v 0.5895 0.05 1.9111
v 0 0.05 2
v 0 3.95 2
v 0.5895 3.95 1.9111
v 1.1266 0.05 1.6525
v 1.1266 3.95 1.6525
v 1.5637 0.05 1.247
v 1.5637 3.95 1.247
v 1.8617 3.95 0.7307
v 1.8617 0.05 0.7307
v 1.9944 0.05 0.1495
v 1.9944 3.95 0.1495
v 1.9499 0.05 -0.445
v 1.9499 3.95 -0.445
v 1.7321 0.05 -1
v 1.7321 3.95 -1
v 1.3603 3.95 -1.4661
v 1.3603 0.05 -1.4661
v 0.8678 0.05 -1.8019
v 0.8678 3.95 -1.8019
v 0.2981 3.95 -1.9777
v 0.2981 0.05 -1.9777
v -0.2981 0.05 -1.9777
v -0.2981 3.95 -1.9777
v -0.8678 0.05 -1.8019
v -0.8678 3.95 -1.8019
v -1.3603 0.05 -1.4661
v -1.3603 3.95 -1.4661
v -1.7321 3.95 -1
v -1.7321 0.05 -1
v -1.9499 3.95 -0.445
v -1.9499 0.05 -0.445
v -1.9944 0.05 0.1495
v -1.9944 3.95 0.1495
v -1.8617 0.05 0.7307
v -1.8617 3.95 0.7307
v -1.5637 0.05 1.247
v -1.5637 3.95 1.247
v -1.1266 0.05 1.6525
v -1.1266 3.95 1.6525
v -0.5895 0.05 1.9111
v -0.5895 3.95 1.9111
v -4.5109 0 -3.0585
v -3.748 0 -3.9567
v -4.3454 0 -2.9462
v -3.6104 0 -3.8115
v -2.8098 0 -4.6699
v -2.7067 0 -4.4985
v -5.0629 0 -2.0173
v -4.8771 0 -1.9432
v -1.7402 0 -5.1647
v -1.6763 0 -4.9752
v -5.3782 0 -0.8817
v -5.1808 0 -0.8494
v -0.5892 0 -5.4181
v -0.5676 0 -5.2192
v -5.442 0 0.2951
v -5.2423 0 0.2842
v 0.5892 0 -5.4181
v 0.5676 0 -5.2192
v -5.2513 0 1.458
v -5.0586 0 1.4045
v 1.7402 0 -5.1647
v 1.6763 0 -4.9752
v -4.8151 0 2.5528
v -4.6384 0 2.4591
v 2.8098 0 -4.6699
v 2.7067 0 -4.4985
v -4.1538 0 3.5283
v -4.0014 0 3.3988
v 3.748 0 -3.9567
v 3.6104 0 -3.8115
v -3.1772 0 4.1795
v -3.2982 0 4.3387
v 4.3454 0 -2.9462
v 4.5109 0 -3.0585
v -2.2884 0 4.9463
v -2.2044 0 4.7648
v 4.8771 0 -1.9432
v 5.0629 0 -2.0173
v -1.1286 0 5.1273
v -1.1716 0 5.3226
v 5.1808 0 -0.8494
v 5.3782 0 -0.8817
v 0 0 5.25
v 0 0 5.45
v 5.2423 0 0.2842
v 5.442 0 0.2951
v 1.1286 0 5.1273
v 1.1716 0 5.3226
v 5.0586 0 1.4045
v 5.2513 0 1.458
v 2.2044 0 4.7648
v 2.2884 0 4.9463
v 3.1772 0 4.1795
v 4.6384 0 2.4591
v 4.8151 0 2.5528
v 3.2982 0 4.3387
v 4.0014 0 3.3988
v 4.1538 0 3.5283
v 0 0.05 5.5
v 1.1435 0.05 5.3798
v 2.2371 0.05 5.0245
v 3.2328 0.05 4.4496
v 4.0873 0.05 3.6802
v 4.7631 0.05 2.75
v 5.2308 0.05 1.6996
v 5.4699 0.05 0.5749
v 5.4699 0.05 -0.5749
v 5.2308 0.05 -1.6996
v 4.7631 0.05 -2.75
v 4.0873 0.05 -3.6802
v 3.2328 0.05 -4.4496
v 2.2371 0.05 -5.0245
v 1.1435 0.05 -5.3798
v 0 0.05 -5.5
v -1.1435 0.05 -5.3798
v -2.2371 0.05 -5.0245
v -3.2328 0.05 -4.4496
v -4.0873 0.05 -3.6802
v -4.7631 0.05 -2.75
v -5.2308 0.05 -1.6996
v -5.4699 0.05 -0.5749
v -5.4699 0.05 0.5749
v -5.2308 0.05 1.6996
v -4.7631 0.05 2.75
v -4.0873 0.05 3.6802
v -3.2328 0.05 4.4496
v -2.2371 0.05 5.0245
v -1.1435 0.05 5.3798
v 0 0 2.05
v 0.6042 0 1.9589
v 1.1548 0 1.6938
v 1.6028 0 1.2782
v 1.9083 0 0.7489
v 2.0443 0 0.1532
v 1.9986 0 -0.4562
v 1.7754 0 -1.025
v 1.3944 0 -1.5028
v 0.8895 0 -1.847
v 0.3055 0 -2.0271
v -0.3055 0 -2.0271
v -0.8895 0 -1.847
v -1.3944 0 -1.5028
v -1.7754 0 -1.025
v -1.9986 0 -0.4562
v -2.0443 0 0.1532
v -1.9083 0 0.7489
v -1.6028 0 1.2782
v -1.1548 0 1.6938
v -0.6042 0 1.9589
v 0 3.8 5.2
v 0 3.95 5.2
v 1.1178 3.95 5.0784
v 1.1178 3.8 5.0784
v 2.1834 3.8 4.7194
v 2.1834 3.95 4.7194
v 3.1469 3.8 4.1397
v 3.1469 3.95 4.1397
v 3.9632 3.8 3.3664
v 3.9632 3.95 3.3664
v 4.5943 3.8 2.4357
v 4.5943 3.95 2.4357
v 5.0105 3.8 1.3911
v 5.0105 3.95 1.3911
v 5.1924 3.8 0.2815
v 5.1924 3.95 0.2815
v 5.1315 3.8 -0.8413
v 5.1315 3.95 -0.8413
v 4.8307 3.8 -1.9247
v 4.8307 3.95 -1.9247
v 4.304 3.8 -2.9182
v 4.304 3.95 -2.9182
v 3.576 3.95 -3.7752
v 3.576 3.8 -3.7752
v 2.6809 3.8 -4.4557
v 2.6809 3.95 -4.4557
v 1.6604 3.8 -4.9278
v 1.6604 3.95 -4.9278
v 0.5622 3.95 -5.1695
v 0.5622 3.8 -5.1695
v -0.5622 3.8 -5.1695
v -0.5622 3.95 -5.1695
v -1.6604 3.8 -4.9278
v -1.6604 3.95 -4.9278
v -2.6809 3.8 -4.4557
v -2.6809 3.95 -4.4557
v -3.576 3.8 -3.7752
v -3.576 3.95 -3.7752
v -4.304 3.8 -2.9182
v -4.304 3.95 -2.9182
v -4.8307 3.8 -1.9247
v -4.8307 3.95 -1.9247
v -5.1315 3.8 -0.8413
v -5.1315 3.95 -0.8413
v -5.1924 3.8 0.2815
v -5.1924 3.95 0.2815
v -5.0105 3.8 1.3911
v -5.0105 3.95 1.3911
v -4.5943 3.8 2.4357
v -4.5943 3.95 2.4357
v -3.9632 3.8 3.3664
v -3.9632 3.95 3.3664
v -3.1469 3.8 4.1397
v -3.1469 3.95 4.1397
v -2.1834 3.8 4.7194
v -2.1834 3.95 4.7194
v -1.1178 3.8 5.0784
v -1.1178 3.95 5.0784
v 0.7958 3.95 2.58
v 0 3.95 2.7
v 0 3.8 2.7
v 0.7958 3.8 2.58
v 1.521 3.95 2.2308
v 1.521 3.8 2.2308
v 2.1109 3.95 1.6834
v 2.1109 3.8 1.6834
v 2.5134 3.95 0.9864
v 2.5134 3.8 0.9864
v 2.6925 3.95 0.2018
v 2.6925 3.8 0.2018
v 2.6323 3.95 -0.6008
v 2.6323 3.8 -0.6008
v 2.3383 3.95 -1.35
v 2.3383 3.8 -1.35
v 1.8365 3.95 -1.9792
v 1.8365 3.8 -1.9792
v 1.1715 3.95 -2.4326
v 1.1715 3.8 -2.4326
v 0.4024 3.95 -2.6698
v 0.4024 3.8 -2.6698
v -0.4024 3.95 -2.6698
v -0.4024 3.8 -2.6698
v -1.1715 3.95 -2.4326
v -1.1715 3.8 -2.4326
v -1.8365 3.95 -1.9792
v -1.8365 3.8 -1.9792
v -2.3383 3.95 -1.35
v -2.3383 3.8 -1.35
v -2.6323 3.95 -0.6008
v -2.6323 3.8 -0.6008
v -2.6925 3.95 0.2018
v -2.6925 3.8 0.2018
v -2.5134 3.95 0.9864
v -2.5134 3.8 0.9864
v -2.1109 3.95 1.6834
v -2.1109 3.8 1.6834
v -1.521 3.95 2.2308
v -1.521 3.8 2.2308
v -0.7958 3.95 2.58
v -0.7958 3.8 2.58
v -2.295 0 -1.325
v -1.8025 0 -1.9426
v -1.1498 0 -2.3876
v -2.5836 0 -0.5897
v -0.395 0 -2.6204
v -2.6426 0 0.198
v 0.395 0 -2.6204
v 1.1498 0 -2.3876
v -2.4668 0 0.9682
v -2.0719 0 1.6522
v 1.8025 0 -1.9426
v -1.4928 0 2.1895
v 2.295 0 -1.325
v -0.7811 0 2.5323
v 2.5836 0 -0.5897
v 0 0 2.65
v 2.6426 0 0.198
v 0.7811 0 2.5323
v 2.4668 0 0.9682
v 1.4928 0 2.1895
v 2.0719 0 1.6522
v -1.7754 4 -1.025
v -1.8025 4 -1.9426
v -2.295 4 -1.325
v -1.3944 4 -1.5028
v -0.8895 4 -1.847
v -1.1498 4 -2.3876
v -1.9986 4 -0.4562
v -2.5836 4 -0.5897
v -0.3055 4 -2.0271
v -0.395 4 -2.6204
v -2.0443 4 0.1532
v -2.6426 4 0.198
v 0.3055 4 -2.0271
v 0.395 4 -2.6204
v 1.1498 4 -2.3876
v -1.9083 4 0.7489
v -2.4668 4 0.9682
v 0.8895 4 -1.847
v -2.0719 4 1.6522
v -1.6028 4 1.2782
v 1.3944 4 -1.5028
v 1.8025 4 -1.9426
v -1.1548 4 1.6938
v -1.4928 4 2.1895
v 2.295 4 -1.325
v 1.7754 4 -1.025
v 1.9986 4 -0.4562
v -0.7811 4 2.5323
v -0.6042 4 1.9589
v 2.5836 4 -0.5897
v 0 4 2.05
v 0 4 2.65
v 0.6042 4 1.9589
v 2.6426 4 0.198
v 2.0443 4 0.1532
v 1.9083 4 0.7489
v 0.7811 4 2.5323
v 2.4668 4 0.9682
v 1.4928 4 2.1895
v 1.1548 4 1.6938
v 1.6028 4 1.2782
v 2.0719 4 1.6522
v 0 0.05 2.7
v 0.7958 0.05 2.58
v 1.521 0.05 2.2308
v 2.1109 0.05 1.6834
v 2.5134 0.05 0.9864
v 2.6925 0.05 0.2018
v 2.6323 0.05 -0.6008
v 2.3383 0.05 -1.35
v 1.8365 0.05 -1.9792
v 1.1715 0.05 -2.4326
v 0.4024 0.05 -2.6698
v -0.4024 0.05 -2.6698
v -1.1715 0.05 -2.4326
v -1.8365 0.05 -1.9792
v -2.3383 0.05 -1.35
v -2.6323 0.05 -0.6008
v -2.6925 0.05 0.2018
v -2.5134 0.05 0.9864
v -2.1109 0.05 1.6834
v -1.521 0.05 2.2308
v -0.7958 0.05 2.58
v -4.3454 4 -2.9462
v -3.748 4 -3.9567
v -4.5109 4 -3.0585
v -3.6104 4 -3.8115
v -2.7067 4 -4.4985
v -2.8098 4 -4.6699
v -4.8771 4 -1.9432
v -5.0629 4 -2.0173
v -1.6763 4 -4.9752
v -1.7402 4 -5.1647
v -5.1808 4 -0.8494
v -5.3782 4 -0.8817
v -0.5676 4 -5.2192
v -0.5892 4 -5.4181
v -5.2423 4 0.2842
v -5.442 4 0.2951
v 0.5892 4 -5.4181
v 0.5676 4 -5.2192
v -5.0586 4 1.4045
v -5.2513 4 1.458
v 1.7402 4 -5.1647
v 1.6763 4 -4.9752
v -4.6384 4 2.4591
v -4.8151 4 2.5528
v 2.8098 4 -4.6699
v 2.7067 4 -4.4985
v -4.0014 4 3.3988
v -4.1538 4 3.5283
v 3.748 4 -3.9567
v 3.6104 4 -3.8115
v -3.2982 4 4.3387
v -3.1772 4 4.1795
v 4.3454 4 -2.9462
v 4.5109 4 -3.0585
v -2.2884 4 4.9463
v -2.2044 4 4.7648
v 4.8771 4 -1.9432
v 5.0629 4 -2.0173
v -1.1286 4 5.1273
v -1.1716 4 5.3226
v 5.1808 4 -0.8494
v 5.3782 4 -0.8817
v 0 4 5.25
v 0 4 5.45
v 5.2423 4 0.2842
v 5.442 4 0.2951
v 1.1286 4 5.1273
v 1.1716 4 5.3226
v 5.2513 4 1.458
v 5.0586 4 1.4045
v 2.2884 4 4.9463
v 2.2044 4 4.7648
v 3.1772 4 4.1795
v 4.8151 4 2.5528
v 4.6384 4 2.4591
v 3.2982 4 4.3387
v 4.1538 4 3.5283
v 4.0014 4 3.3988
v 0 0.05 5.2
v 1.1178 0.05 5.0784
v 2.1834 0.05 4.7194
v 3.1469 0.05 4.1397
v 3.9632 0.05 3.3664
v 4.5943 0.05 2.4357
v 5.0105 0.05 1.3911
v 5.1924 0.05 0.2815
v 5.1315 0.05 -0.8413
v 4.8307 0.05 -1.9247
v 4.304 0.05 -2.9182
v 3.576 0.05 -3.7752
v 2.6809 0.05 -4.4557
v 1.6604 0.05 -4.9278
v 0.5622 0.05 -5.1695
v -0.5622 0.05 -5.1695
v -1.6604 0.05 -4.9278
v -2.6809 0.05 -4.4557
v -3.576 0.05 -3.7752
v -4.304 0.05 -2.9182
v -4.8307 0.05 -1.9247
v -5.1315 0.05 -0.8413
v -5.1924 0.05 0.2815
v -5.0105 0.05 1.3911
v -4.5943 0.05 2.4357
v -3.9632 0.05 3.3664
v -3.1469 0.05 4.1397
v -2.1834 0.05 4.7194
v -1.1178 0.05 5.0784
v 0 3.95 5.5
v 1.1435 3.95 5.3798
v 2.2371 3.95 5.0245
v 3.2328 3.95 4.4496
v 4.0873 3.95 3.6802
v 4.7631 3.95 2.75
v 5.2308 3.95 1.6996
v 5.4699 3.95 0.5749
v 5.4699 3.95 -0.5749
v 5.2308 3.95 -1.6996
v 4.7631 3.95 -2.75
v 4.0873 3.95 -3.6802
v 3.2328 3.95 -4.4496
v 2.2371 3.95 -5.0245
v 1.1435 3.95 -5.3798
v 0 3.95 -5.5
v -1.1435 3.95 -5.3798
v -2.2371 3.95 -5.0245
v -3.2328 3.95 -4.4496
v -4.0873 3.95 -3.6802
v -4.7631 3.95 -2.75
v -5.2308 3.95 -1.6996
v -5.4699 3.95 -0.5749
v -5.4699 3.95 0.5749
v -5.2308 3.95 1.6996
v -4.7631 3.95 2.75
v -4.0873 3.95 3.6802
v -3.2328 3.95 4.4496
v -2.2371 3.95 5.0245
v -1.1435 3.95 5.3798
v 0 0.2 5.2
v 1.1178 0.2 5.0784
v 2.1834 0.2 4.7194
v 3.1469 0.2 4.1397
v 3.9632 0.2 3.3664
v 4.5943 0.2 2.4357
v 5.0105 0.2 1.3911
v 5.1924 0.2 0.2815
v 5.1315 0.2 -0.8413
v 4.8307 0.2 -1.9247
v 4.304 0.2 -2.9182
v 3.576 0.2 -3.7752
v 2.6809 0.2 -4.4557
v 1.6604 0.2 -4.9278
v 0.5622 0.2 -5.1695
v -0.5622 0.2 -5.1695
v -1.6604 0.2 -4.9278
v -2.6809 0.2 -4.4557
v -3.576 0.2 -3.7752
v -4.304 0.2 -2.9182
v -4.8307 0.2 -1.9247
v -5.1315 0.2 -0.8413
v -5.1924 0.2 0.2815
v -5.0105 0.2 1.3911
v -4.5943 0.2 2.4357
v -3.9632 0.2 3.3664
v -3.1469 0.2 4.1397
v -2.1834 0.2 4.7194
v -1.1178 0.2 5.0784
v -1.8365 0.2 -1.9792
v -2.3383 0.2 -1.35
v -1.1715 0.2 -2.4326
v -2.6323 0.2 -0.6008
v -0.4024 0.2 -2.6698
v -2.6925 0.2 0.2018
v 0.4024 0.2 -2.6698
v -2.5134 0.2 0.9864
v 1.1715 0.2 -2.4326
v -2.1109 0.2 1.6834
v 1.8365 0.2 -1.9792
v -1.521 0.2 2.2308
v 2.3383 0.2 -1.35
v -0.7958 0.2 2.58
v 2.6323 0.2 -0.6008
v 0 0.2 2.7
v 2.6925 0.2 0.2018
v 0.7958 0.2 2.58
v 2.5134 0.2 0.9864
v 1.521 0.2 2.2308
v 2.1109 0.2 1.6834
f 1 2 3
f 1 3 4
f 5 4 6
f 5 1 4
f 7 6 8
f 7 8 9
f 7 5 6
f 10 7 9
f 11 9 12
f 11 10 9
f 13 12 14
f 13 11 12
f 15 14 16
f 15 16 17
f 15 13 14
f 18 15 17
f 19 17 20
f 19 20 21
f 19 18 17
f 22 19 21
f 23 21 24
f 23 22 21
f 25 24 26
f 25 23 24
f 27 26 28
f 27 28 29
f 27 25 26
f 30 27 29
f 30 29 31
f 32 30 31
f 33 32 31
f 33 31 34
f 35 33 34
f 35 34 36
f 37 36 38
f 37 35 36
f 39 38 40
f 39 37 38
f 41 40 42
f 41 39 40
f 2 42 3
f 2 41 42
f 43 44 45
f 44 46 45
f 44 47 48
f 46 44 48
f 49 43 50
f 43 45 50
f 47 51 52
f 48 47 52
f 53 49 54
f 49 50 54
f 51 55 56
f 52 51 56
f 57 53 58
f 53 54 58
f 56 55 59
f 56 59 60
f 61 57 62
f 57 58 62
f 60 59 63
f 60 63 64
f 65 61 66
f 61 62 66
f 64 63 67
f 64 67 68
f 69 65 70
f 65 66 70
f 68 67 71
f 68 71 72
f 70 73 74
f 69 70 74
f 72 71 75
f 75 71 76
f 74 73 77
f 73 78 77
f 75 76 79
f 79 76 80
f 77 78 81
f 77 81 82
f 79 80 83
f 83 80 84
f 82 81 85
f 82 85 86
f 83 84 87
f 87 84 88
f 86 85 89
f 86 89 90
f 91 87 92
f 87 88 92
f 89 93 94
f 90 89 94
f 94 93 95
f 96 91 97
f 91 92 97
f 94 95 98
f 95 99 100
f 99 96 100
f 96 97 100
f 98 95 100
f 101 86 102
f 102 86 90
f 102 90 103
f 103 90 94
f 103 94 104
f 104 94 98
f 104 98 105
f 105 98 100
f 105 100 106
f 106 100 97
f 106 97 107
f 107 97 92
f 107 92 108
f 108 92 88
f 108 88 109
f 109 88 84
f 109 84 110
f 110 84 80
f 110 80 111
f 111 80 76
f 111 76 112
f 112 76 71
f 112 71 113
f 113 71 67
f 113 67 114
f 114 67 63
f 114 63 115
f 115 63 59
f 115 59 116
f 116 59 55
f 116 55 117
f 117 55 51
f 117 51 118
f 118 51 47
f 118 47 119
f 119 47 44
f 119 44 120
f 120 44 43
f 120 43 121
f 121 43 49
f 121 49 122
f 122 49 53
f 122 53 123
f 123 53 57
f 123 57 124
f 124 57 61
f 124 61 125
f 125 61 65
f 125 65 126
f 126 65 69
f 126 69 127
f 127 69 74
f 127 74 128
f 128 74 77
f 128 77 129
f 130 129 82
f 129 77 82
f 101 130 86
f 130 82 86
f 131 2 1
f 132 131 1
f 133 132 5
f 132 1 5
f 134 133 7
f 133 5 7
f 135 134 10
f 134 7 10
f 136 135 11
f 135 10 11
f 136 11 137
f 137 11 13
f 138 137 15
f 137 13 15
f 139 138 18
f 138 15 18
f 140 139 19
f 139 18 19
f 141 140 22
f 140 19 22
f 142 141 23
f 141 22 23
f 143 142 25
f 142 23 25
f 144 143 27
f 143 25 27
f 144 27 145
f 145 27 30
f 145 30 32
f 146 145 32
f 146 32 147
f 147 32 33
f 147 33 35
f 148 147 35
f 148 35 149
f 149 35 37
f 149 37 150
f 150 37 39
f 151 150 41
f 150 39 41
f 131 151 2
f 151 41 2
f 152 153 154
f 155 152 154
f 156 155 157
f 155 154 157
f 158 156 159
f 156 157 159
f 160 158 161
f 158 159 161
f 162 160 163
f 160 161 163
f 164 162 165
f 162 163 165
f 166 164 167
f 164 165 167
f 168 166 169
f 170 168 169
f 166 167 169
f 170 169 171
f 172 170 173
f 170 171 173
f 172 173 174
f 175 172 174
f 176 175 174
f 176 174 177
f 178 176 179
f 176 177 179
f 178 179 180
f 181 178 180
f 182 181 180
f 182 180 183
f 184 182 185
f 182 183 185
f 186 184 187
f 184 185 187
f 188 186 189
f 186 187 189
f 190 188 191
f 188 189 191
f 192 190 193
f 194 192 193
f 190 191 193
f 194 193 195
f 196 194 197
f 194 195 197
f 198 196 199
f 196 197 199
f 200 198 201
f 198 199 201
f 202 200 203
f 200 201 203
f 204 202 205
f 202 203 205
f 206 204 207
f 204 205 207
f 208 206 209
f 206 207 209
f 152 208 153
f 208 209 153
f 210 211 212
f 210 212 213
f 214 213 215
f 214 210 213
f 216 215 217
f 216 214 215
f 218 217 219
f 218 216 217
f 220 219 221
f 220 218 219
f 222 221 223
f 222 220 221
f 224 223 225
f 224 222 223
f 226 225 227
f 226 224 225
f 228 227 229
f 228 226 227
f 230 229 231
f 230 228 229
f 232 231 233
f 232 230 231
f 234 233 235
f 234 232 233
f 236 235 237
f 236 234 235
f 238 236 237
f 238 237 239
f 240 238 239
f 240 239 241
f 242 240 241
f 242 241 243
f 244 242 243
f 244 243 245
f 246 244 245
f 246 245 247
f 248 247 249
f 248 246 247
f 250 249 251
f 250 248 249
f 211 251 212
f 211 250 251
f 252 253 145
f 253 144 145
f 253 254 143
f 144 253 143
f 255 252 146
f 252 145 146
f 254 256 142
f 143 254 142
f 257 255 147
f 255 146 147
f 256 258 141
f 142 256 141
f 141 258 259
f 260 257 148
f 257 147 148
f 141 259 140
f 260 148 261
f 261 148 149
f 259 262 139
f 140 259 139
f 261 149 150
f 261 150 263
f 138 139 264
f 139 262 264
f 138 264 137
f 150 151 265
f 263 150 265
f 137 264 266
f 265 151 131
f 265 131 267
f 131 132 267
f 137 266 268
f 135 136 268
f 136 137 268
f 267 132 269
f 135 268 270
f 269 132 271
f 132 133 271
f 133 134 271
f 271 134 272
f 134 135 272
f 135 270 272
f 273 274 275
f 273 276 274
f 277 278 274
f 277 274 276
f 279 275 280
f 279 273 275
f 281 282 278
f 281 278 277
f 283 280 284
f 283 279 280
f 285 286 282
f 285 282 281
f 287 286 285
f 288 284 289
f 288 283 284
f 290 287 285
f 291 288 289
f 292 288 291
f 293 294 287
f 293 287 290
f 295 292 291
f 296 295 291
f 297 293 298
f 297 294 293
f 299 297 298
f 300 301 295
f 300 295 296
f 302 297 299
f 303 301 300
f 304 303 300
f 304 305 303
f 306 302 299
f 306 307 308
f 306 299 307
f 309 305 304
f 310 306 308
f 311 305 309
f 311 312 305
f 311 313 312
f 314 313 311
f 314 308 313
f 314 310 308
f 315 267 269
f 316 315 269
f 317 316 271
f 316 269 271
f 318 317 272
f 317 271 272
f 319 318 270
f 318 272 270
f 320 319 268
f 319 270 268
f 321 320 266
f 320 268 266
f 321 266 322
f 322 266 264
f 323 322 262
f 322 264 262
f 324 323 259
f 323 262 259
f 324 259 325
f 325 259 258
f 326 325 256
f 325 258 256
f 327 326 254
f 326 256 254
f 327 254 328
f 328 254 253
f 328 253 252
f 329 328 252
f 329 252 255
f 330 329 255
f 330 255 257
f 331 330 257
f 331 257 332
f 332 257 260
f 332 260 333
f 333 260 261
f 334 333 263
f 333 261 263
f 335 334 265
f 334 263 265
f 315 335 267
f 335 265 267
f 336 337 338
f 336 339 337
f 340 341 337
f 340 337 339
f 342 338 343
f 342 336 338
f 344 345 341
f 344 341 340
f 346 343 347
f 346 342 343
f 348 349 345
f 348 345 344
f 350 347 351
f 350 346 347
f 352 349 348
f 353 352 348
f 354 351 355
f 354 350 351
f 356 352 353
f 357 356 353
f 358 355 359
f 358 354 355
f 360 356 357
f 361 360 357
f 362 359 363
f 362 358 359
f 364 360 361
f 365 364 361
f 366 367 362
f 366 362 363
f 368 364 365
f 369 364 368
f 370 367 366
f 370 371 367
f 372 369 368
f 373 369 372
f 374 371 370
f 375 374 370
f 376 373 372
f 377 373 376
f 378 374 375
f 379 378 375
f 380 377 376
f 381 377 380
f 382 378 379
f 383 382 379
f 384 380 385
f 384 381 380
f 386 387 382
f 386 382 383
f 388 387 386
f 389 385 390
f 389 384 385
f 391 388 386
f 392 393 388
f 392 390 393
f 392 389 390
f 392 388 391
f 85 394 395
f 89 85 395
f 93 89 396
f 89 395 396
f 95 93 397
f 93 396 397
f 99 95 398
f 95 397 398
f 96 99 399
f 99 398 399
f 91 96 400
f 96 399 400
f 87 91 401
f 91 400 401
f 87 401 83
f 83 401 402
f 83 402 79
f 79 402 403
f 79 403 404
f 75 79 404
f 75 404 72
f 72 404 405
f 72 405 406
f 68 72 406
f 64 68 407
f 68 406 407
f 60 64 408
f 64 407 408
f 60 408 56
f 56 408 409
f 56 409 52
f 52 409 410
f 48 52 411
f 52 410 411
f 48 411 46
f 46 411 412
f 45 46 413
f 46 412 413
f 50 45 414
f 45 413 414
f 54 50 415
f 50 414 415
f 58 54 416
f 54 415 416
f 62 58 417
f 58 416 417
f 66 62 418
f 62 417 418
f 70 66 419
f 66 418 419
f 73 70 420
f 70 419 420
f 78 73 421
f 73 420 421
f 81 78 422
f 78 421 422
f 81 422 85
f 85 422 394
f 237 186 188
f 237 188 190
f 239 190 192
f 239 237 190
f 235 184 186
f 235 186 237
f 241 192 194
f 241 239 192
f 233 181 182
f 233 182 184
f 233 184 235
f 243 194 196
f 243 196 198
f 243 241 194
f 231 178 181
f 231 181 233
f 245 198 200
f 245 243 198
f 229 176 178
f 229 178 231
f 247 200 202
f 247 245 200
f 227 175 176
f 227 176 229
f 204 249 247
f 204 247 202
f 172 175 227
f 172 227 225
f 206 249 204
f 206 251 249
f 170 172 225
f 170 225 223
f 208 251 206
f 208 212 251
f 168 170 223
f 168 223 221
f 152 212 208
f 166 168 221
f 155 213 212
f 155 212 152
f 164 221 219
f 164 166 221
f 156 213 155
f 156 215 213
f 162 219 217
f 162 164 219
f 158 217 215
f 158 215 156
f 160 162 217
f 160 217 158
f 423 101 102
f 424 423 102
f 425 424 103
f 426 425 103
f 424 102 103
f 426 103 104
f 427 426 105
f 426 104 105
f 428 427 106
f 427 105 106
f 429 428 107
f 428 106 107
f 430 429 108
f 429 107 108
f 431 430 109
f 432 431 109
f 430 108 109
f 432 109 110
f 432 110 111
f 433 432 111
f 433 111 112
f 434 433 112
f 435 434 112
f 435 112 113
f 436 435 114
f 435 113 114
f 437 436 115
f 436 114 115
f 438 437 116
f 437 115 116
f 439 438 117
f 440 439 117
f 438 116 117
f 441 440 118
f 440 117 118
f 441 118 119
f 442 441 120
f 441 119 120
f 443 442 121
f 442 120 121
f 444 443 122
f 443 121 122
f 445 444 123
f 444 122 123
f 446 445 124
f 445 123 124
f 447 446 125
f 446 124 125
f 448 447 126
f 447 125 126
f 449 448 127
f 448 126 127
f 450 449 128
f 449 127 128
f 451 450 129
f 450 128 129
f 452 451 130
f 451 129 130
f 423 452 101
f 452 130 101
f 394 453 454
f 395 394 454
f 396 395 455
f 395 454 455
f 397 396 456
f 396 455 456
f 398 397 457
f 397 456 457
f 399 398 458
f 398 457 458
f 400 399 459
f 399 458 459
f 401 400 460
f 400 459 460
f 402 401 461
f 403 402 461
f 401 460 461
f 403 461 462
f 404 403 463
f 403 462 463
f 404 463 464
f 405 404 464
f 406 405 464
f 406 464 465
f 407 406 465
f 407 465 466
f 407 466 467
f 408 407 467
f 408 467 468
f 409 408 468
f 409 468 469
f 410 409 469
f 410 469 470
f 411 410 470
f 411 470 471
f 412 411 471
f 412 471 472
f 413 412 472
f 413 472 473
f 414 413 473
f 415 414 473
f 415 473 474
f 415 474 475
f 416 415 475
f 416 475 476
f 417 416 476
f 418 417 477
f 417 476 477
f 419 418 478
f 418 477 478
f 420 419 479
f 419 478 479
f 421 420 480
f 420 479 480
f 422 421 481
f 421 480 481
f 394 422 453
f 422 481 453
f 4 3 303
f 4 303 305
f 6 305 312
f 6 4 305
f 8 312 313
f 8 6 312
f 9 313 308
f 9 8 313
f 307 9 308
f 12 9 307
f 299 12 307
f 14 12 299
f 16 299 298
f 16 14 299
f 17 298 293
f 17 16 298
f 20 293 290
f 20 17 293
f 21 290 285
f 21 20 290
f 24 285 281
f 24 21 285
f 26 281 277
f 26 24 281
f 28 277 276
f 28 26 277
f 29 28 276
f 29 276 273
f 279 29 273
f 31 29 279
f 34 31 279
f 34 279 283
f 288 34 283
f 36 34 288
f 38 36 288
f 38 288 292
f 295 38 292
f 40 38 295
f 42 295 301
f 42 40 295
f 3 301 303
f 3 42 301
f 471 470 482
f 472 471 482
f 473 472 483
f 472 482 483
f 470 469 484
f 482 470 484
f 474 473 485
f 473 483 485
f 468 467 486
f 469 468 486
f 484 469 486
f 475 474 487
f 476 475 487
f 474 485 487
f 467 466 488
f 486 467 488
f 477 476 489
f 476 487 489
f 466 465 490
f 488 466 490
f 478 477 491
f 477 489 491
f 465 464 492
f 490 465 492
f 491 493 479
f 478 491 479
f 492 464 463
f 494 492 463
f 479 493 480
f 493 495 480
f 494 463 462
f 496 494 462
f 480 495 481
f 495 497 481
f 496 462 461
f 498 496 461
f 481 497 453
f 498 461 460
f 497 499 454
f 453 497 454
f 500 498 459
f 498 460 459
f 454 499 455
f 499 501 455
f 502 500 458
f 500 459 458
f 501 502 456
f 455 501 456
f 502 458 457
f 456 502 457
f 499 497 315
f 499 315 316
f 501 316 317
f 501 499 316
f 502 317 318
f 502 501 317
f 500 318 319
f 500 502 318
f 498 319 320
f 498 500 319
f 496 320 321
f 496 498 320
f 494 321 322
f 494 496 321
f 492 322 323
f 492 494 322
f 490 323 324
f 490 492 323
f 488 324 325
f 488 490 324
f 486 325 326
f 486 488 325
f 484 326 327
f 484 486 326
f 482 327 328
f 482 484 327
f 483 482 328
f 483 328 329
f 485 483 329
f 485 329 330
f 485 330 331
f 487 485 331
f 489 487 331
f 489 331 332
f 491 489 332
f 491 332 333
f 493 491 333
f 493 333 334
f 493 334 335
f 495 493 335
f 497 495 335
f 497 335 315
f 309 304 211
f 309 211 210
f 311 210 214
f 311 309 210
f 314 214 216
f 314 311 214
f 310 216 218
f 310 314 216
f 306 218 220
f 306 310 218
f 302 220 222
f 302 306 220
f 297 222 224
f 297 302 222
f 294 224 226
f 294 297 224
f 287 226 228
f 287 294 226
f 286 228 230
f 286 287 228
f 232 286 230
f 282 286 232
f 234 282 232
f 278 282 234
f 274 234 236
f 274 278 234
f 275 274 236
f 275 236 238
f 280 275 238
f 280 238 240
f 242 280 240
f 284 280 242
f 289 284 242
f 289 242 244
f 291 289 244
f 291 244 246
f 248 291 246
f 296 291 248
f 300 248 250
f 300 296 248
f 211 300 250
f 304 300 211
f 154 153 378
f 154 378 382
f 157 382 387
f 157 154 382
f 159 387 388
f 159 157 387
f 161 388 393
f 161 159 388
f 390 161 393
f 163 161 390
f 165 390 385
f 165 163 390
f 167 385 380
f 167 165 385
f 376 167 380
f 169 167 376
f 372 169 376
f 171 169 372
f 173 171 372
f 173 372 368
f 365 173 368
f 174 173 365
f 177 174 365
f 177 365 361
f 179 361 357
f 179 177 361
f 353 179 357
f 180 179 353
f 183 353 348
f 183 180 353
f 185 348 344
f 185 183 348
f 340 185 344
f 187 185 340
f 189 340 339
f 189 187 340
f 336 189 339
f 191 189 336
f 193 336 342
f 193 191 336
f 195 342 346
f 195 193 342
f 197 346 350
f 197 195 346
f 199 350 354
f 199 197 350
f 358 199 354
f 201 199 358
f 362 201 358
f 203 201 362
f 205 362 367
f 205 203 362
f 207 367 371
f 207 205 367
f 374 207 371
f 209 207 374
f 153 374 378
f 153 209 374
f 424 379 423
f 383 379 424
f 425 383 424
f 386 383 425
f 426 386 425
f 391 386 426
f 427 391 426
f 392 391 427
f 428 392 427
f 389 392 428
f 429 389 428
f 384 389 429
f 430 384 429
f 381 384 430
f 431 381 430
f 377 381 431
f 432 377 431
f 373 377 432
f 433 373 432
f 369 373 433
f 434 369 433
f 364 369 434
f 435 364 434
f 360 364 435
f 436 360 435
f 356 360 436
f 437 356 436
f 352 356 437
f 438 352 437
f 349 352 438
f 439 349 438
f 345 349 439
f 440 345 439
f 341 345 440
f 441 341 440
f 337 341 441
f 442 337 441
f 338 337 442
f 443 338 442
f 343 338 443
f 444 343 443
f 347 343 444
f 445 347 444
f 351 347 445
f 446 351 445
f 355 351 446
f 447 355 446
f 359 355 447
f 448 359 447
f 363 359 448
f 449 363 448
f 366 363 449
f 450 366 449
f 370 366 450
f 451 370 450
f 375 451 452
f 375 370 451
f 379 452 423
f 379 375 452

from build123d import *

# Parameters (mm, degrees)
SKETCH_1_R          = 5.5
SKETCH_1_R_2        = 2
EXTRUDE_1_DEPTH     = 4
SKETCH_2_R          = 5.2
SKETCH_2_R_2        = 2.7
CUT_EXTRUDE_1_DEPTH = 0.2
CUT_EXTRUDE_START   = -3.8
SKETCH_2_2_R        = 5.2
SKETCH_2_2_R_2      = 2.7
CUT_EXTRUDE_2_DEPTH = 5.946427842
CHAMFER_1_SIZE      = 0.05


with BuildPart() as part:
    # Эскиз1 → Бобышка-Вытянуть1 (new body)
    with BuildSketch(Plane(origin=(0, 0, 0), x_dir=(1, 0, 0), z_dir=(0, 1, 0))):
        Circle(SKETCH_1_R)
        Circle(SKETCH_1_R_2, mode=Mode.SUBTRACT)
    extrude(amount=EXTRUDE_1_DEPTH)

    # Эскиз2 → Вырез-Вытянуть1 (cut)
    with BuildSketch(Plane(origin=(0, 4, 0), x_dir=(1, 0, 0), z_dir=(0, 1, 0))):
        Circle(SKETCH_2_R)
        Circle(SKETCH_2_R_2, mode=Mode.SUBTRACT)
    extrude(amount=-CUT_EXTRUDE_1_DEPTH, mode=Mode.SUBTRACT)

    # Эскиз2<2> → Вырез-Вытянуть2 (cut, through all)
    with BuildSketch(Plane(origin=(0, 4, 0), x_dir=(1, 0, 0), z_dir=(0, 1, 0)).offset(CUT_EXTRUDE_START)):
        Circle(SKETCH_2_2_R)
        Circle(SKETCH_2_2_R_2, mode=Mode.SUBTRACT)
    extrude(amount=-CUT_EXTRUDE_2_DEPTH, mode=Mode.SUBTRACT)

    # Фаска1
    chamfer_1_edges = [part.edges().sort_by_distance(p)[0] for p in [
        (-2.7, 0, 0),
        (-2, 0, 0),
        (-5.5, 0, 0),
        (-5.2, 0, 0),
        (-2.7, 4, 0),
        (-2, 4, 0),
        (-5.5, 4, 0),
        (-5.2, 4, 0),
    ]]
    chamfer(chamfer_1_edges, length=CHAMFER_1_SIZE)


solid = part.part
